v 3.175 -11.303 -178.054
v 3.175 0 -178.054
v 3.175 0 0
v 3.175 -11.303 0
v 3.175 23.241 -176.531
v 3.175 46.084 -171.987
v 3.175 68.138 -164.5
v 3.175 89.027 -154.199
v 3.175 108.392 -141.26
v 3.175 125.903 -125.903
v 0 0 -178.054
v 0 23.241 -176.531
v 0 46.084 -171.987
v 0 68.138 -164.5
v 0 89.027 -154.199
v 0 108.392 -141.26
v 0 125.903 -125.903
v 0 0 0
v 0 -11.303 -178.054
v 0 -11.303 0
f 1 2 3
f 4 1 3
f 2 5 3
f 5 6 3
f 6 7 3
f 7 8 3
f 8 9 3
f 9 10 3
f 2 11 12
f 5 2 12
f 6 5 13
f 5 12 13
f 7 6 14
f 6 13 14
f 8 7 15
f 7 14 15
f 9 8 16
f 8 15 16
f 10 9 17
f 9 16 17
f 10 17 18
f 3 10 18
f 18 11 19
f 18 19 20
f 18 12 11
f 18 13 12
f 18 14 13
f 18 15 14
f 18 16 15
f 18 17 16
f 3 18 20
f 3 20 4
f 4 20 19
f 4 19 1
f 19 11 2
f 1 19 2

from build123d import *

# Parameters (mm, degrees)
BOSS_EXTRUDE1_DEPTH = 3.175
SKETCH2_W           = 3.175
SKETCH2_H           = 178.054
BOSS_EXTRUDE2_DEPTH = 11.303


with BuildPart() as part:
    # Sketch1 → Boss-Extrude1 (new body)
    with BuildSketch(Plane(origin=(0, 0, 0), x_dir=(0, 0, -1), z_dir=(1, 0, 0))):
        with BuildLine():
            Line((0, 0), (178.054, 0))
            ThreePointArc((178.054, 0), (164.500446282, 68.138315866), (125.903190817, 125.903190817))
            Line((125.903190817, 125.903190817), (0, 0))
        make_face()
    extrude(amount=BOSS_EXTRUDE1_DEPTH)

    # Sketch2 → Boss-Extrude2 (add)
    with BuildSketch(Plane.XZ):
        with Locations((1.5875, -89.027)):
            Rectangle(SKETCH2_W, SKETCH2_H)
    extrude(amount=BOSS_EXTRUDE2_DEPTH)


solid = part.part
